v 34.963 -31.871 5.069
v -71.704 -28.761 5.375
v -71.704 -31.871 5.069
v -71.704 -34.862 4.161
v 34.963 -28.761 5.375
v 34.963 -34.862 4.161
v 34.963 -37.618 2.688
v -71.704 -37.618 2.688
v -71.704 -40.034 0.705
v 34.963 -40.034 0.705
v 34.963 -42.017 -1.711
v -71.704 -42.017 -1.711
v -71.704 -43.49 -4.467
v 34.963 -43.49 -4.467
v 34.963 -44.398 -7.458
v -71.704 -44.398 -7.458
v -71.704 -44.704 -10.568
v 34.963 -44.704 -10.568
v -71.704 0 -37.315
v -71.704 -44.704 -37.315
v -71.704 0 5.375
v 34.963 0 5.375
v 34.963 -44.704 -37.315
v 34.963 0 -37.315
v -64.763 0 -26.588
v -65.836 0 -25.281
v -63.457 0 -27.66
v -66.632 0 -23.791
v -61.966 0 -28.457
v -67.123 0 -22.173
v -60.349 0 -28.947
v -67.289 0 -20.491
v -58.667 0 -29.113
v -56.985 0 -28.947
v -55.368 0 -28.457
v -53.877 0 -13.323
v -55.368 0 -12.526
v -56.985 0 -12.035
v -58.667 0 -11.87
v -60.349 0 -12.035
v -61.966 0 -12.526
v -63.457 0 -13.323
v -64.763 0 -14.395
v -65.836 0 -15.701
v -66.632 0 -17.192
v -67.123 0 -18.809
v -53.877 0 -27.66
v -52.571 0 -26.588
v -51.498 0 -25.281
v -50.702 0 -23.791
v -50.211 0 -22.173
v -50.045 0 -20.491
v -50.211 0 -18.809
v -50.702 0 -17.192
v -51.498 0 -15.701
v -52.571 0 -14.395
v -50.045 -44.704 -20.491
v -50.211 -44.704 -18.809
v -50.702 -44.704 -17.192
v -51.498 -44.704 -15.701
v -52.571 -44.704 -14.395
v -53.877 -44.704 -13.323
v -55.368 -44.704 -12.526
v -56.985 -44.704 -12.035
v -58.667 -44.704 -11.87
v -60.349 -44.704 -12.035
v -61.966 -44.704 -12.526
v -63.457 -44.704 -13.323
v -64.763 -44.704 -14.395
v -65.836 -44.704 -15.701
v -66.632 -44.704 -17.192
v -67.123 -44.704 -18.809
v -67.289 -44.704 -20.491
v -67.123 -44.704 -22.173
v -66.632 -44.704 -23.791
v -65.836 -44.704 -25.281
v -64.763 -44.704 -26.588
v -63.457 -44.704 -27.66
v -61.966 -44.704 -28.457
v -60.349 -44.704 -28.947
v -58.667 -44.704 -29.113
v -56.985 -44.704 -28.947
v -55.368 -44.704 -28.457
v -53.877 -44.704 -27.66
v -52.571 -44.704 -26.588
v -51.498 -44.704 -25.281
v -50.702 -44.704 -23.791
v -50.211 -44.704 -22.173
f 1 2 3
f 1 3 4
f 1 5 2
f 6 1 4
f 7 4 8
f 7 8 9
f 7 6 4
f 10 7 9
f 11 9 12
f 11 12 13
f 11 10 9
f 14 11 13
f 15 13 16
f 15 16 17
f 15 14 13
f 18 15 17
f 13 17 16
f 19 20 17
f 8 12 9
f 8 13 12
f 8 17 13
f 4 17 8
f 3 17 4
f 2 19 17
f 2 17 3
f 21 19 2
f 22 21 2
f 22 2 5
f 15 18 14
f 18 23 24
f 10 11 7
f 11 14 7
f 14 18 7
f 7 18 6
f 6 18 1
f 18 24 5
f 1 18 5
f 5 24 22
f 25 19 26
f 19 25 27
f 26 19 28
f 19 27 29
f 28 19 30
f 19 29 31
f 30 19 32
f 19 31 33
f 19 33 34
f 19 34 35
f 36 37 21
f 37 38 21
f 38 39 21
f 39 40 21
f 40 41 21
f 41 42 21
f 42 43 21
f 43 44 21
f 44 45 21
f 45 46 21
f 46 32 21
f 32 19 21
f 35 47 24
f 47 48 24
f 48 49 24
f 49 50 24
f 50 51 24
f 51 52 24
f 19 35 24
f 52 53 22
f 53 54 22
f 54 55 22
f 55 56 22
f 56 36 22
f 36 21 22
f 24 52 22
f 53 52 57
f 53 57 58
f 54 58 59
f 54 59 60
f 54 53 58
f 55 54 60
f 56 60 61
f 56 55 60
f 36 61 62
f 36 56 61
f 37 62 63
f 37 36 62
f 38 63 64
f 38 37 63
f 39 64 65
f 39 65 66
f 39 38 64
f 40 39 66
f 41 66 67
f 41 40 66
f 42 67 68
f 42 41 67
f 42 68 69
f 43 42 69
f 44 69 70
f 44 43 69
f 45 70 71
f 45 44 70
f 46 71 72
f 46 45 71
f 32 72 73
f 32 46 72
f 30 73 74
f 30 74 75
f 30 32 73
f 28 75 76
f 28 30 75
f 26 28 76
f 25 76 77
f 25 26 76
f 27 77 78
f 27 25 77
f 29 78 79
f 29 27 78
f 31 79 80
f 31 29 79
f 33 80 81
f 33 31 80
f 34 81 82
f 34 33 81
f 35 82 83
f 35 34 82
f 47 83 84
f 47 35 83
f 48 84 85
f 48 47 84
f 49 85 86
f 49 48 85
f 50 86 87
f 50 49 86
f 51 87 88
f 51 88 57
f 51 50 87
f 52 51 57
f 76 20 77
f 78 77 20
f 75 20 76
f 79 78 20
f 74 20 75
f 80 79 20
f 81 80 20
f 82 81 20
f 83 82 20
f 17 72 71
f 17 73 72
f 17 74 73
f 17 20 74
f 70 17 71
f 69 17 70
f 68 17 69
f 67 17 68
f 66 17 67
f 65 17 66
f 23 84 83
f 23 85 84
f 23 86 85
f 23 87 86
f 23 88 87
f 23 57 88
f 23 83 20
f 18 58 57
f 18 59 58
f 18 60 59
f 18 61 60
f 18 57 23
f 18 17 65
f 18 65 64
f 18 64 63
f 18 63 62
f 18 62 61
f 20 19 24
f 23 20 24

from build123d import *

# Parameters (mm, degrees)
F0_W     = 106.66725
F0_H     = 42.689698
F0_R     = 8.621606
F1_DEPTH = 44.704
F2_R     = 15.943466


with BuildPart() as f1:
    # F0 (on Front) → F1 (new body)
    with BuildSketch(Plane.XZ):
        with Locations((-18.370472, -15.969823)):
            Rectangle(F0_W, F0_H)
        with Locations((-58.666989, -20.491278)):
            Circle(F0_R, mode=Mode.SUBTRACT)
    extrude(amount=F1_DEPTH)

    # F2
    f2_edges = [f1.edges().sort_by_distance(p)[0] for p in [
        (-18.370472, -44.704, 5.375026),
    ]]
    fillet(f2_edges, radius=F2_R)


solid = f1.part
